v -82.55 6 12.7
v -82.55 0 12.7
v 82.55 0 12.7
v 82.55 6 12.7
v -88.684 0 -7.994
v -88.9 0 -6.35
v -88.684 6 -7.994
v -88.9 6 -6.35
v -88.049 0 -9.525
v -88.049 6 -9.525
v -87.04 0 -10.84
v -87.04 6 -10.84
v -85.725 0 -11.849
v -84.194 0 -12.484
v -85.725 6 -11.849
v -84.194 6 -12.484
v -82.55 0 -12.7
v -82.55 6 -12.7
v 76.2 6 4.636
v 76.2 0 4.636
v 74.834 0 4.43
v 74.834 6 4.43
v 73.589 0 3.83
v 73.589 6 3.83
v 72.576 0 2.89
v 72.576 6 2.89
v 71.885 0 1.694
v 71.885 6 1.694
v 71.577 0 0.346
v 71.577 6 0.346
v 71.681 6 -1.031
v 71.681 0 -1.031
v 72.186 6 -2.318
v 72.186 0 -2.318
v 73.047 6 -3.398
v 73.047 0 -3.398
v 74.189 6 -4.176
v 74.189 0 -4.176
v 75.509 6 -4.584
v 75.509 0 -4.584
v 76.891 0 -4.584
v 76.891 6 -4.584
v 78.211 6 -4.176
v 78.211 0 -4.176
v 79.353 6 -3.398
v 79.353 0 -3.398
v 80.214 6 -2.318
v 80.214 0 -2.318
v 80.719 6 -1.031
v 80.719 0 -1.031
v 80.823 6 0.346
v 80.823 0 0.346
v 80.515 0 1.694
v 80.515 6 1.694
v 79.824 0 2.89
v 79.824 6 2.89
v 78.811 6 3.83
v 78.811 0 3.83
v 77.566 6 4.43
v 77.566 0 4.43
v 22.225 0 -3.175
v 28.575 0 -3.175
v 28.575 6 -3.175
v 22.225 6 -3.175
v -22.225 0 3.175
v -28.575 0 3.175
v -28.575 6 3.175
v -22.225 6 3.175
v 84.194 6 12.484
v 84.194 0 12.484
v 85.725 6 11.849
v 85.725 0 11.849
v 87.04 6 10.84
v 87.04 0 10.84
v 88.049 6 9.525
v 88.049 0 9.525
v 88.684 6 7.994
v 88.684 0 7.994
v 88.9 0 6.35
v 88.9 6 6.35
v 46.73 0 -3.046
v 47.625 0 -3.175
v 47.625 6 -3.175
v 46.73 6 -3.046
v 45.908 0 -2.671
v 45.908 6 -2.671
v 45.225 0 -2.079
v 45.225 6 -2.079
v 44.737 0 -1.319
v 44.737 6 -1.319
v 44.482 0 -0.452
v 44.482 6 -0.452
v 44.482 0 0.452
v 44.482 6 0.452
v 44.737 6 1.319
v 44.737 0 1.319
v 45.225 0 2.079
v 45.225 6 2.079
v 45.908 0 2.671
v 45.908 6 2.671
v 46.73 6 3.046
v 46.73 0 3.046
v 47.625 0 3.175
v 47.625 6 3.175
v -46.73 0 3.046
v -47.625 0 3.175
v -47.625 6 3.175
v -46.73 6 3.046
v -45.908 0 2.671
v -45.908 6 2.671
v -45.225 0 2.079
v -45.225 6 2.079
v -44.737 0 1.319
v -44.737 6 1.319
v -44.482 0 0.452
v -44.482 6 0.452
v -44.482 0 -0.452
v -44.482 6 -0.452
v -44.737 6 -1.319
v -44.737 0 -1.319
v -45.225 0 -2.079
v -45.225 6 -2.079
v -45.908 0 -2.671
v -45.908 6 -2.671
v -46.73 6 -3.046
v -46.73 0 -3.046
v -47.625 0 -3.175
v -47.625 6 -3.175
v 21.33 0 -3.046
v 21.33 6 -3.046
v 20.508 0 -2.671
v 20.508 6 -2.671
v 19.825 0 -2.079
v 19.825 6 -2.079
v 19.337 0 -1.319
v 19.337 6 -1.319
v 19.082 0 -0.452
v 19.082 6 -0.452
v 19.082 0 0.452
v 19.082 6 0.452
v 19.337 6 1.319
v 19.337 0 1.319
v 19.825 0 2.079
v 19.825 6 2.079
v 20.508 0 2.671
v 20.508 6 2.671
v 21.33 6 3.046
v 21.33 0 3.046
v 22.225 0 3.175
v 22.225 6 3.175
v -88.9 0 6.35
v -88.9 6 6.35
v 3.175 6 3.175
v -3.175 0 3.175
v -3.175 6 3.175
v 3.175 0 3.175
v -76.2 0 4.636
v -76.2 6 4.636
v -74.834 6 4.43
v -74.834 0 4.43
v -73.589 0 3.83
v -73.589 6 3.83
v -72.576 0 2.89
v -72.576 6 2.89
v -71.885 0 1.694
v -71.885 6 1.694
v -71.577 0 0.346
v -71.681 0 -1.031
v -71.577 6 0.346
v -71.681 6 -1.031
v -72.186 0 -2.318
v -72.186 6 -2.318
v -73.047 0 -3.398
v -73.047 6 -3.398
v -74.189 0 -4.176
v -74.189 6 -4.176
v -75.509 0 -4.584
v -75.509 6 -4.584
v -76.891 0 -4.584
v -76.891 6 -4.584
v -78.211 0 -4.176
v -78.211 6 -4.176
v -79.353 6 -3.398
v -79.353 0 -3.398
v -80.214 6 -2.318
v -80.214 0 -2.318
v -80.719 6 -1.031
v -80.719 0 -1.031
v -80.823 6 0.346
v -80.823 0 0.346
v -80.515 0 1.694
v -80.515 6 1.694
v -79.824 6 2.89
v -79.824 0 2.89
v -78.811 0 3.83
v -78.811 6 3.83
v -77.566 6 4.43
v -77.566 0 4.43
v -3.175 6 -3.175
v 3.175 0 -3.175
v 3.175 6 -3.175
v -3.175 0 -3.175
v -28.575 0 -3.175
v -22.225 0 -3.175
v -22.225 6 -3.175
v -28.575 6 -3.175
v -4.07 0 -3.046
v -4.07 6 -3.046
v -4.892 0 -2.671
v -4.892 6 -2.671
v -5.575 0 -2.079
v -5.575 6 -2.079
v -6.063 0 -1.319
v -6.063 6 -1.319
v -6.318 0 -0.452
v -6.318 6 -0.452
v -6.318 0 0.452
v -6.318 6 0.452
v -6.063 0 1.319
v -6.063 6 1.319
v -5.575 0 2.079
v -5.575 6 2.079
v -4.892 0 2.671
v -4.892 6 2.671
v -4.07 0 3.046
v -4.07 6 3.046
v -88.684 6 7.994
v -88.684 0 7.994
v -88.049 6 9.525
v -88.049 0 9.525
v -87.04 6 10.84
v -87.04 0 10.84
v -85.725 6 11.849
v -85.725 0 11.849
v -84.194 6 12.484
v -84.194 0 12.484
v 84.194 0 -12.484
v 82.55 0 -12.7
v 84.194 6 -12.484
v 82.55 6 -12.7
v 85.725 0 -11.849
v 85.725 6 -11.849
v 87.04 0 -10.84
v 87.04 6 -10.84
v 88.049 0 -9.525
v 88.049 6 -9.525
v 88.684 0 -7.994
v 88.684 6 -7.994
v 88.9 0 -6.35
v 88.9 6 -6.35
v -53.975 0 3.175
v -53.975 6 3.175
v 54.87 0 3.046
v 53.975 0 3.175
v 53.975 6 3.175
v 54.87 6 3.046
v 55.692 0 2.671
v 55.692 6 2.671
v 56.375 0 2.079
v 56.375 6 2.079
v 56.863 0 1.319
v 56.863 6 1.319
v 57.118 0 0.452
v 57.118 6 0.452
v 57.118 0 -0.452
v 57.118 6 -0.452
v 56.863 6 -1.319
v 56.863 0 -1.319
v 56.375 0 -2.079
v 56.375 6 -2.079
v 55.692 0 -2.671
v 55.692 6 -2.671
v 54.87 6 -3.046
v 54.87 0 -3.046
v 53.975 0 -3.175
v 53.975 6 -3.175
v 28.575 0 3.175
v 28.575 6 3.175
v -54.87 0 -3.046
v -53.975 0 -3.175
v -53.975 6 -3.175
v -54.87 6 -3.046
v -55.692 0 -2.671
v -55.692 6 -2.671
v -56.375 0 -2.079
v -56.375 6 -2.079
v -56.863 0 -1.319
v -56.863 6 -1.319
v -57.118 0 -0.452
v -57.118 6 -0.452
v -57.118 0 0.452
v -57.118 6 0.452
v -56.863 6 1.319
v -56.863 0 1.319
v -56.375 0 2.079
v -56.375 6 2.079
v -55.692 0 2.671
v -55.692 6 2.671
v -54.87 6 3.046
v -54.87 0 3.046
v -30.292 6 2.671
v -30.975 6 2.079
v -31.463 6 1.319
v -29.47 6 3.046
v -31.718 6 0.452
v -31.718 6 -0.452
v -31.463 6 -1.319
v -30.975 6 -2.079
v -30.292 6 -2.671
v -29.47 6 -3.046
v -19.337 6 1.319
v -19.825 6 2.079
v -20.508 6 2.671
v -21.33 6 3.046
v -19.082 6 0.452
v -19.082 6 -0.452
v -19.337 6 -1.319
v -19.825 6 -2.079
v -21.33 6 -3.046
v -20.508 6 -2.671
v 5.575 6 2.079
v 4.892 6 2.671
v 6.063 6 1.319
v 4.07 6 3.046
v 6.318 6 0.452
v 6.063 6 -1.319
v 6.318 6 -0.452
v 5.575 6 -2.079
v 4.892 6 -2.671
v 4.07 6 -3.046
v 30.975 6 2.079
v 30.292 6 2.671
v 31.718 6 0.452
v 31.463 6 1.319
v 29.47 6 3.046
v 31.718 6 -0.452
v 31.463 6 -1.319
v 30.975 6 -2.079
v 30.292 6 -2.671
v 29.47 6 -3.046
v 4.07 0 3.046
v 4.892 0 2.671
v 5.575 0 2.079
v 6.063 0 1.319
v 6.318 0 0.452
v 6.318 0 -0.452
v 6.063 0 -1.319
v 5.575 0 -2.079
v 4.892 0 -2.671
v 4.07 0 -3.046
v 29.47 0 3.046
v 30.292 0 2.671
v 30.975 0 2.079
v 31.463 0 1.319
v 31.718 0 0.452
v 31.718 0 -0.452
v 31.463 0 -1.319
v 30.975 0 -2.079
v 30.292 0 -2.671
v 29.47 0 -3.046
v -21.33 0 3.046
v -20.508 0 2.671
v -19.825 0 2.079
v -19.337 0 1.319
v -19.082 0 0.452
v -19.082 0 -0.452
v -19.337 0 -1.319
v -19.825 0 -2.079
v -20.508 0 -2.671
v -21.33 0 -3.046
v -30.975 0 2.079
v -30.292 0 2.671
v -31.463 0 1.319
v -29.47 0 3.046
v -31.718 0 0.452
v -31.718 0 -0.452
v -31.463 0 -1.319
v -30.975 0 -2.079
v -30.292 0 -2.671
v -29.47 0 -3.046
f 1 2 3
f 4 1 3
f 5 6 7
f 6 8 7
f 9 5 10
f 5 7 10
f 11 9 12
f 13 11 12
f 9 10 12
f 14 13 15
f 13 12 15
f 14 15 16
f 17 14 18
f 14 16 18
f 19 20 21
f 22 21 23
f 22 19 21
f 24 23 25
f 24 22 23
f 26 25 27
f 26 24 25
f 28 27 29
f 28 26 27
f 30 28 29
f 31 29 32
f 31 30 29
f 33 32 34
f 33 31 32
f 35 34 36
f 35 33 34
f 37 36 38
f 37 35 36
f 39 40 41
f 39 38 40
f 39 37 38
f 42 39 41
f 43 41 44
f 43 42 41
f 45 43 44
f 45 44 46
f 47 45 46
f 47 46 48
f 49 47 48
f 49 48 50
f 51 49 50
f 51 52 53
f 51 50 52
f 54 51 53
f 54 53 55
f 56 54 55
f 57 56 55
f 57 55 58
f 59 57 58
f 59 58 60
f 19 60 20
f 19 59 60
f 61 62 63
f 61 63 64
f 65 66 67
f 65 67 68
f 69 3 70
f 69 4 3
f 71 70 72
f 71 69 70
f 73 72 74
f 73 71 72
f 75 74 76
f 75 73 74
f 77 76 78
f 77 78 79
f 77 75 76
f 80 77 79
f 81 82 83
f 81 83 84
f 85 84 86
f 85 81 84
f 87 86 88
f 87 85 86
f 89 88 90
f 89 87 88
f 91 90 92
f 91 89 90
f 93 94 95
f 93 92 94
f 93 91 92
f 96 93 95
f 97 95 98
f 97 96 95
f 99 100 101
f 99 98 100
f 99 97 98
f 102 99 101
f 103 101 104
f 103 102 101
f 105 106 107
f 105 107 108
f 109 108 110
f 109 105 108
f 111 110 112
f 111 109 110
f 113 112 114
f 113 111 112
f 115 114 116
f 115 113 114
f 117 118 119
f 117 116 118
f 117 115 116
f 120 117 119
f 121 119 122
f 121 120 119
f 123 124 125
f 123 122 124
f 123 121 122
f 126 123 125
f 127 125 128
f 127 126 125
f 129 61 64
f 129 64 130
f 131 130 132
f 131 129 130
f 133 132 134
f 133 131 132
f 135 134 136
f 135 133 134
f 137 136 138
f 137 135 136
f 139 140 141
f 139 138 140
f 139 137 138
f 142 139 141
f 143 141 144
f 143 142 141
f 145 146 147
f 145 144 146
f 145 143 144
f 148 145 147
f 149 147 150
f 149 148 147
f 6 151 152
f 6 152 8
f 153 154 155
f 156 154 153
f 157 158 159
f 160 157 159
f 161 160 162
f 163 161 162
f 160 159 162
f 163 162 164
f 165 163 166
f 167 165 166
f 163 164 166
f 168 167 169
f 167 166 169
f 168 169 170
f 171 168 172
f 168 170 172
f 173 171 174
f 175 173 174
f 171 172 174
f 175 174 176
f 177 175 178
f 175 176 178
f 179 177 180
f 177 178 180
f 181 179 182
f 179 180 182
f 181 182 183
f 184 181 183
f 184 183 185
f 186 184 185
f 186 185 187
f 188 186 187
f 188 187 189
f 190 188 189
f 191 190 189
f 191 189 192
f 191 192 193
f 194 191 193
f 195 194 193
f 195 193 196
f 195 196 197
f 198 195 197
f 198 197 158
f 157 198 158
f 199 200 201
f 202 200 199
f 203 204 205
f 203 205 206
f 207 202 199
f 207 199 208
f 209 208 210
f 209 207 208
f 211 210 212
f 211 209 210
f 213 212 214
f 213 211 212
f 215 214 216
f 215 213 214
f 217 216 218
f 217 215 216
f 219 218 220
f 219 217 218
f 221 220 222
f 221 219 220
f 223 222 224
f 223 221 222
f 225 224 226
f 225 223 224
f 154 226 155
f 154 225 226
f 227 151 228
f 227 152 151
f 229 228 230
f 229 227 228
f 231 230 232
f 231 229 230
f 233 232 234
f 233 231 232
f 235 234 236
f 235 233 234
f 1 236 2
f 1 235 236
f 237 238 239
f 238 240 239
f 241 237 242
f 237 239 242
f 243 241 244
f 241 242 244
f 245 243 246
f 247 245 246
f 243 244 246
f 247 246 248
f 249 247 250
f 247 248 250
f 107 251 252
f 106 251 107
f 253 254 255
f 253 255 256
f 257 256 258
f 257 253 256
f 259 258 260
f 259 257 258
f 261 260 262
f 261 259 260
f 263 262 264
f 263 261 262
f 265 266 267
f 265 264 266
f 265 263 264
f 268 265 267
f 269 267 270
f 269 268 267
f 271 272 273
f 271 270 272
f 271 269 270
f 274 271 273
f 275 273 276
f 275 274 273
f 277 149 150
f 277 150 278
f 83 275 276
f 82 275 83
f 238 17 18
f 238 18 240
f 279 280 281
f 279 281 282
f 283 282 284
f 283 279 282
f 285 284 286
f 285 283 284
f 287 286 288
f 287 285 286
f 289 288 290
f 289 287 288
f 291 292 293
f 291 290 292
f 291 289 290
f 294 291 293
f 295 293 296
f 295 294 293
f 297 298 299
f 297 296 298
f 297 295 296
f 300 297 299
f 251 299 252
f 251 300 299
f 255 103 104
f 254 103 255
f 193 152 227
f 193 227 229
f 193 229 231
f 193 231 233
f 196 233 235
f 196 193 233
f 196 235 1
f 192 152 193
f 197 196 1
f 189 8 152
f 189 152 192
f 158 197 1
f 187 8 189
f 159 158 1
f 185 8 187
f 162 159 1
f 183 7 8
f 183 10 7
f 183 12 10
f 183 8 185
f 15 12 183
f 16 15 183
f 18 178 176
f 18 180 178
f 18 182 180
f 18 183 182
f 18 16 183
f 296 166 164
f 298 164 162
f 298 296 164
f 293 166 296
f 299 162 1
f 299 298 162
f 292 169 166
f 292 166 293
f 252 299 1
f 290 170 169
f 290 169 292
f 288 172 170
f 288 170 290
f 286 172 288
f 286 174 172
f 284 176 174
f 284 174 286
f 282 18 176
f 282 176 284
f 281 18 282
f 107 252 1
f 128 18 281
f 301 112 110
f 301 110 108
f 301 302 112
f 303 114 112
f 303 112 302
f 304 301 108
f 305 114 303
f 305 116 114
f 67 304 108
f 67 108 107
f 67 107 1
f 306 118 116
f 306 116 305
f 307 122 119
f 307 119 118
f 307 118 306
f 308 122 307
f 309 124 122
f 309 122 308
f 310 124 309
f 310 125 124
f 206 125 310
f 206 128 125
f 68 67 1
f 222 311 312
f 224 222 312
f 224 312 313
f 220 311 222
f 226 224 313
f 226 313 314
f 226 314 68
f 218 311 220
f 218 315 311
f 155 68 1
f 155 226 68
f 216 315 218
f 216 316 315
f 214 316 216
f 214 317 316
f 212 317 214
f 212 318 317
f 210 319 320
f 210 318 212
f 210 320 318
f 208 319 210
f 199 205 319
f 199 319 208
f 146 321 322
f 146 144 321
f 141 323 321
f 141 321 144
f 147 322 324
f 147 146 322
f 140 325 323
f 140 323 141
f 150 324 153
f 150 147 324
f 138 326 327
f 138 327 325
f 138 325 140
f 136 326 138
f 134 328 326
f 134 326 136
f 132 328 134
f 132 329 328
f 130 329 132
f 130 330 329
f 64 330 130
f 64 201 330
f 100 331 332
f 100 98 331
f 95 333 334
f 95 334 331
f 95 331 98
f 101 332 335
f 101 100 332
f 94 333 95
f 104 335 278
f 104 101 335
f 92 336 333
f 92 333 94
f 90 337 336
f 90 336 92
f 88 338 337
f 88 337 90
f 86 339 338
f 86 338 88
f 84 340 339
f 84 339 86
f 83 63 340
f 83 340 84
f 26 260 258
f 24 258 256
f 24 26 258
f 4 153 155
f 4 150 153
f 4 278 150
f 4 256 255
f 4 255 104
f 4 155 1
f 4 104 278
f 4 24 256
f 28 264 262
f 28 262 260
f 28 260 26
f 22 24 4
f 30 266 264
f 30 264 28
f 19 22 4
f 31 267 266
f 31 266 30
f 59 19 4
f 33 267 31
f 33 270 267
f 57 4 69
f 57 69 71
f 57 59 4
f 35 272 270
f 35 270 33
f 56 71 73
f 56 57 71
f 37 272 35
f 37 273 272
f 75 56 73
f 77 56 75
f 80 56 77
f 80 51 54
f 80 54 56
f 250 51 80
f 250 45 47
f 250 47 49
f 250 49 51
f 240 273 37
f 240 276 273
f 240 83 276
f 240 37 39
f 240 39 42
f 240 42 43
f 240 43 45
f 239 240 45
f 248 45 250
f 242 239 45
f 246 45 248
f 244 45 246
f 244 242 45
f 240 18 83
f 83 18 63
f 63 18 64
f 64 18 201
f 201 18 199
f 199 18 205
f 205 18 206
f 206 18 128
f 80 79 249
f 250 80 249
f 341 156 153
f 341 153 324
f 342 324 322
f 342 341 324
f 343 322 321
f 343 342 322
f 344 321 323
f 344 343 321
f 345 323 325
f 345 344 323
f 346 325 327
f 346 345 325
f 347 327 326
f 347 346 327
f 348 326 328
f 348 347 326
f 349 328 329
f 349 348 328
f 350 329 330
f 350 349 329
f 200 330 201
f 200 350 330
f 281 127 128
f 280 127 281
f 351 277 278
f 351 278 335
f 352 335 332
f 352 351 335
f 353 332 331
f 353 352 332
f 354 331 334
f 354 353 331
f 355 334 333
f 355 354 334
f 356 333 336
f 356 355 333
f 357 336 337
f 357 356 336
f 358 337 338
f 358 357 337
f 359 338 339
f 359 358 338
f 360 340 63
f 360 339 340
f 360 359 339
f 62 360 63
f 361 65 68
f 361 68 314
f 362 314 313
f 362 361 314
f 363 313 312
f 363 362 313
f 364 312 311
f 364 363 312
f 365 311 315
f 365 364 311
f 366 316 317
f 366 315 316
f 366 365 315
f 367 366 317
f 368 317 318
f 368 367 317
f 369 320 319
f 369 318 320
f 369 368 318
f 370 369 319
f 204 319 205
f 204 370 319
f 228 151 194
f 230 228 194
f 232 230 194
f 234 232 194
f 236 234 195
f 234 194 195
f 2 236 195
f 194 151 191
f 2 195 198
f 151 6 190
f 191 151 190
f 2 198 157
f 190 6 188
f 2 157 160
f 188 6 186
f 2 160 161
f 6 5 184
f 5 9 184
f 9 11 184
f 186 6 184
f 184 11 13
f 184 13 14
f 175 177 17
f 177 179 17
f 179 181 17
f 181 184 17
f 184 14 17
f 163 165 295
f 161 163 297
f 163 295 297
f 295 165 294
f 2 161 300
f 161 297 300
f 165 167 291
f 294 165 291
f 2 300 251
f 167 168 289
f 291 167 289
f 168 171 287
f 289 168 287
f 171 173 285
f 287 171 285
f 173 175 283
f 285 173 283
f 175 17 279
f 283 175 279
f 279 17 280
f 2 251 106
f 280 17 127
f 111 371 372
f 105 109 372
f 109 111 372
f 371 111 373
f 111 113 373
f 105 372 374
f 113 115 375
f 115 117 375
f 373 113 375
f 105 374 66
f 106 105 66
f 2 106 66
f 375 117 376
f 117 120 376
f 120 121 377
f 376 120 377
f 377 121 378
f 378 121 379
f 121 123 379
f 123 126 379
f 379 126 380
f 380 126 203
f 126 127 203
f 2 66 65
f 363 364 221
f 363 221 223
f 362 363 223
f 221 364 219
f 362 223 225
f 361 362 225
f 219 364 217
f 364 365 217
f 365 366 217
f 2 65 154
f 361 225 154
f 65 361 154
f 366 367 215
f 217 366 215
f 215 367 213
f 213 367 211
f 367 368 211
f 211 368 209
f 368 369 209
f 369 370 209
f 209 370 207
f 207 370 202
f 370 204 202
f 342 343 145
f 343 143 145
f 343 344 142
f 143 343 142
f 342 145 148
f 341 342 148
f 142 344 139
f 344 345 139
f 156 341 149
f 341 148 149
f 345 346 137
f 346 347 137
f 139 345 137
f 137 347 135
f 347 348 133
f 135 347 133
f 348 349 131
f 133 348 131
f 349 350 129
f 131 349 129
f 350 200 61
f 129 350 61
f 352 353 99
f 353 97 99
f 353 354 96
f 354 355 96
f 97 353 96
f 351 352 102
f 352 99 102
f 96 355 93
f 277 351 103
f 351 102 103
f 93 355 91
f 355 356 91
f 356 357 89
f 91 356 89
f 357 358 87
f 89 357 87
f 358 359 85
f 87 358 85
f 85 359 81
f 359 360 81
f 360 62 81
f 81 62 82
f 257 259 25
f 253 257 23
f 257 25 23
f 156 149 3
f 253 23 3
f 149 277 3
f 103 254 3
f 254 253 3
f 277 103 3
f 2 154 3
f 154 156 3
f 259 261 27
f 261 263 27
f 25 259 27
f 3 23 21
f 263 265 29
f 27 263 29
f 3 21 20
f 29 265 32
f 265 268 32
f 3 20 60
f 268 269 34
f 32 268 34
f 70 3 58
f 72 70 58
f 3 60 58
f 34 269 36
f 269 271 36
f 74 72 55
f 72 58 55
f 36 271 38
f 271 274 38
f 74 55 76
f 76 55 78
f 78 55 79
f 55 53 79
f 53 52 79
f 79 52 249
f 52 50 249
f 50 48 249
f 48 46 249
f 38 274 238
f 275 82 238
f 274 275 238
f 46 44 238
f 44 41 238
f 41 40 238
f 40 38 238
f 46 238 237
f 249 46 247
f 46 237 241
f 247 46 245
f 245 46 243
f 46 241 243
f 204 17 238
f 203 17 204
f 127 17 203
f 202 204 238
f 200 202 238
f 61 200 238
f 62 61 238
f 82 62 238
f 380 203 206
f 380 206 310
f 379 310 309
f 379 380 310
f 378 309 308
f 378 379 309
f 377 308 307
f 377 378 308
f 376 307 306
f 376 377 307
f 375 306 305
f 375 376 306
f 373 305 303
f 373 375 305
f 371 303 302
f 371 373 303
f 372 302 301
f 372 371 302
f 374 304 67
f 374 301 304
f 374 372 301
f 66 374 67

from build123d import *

# Parameters (mm, degrees)
SKETCH1_W           = 177.8
SKETCH1_H           = 25.4
BOSS_EXTRUDE1_DEPTH = 6
CUT_EXTRUDE2_DEPTH  = 91.002777735
FILLET1_R           = 6.35
SKETCH5_R           = 4.6355
CUT_EXTRUDE3_DEPTH  = 91.002777735


with BuildPart() as part:
    # Sketch1 → Boss-Extrude1 (new body)
    with BuildSketch(Plane(origin=(0, 0, 0), x_dir=(1, 0, 0), z_dir=(0, 1, 0))):
        Rectangle(SKETCH1_W, SKETCH1_H)
    extrude(amount=BOSS_EXTRUDE1_DEPTH)

    # Sketch4 → Cut-Extrude2 (cut, through all)
    with BuildSketch(Plane.XZ):
        with BuildLine():
            Line((-53.975, 3.175), (-47.625, 3.175))
            ThreePointArc((-47.625, 3.175), (-44.45, 0), (-47.625, -3.175))
            Line((-47.625, -3.175), (-53.975, -3.175))
            ThreePointArc((-53.975, -3.175), (-57.15, 0), (-53.975, 3.175))
        make_face()
        with BuildLine():
            Line((-28.575, 3.175), (-22.225, 3.175))
            ThreePointArc((-22.225, 3.175), (-19.05, 0), (-22.225, -3.175))
            Line((-22.225, -3.175), (-28.575, -3.175))
            ThreePointArc((-28.575, -3.175), (-31.75, 0), (-28.575, 3.175))
        make_face()
        with BuildLine():
            Line((-3.175, 3.175), (3.175, 3.175))
            ThreePointArc((3.175, 3.175), (6.35, 0), (3.175, -3.175))
            Line((3.175, -3.175), (-3.175, -3.175))
            ThreePointArc((-3.175, -3.175), (-6.35, 0), (-3.175, 3.175))
        make_face()
        with BuildLine():
            Line((22.225, 3.175), (28.575, 3.175))
            ThreePointArc((28.575, 3.175), (31.75, 0), (28.575, -3.175))
            Line((28.575, -3.175), (22.225, -3.175))
            ThreePointArc((22.225, -3.175), (19.05, 0), (22.225, 3.175))
        make_face()
        with BuildLine():
            Line((47.625, 3.175), (53.975, 3.175))
            ThreePointArc((53.975, 3.175), (57.15, 0), (53.975, -3.175))
            Line((53.975, -3.175), (47.625, -3.175))
            ThreePointArc((47.625, -3.175), (44.45, 0), (47.625, 3.175))
        make_face()
    extrude(amount=-CUT_EXTRUDE2_DEPTH, mode=Mode.SUBTRACT)

    # Fillet1
    fillet1_edges = [part.edges().sort_by_distance(p)[0] for p in [
        (-88.9, 3, -12.7),
        (88.9, 3, -12.7),
        (88.9, 3, 12.7),
        (-88.9, 3, 12.7),
    ]]
    fillet(fillet1_edges, radius=FILLET1_R)

    # Sketch5 → Cut-Extrude3 (cut, through all)
    with BuildSketch(Plane(origin=(0, 6, 0), x_dir=(1, 0, 0), z_dir=(0, 1, 0))):
        with Locations(Location((-76.2, 0, 0), (0, 0, 270))):
            Circle(SKETCH5_R)
    cut_extrude3 = extrude(amount=-CUT_EXTRUDE3_DEPTH, mode=Mode.SUBTRACT)

    # Mirror1: Cut-Extrude3 across plane
    add(cut_extrude3.mirror(Plane(origin=(0, 0, 0), x_dir=(0, 0, 1), z_dir=(1, 0, 0))), mode=Mode.SUBTRACT)


solid = part.part
